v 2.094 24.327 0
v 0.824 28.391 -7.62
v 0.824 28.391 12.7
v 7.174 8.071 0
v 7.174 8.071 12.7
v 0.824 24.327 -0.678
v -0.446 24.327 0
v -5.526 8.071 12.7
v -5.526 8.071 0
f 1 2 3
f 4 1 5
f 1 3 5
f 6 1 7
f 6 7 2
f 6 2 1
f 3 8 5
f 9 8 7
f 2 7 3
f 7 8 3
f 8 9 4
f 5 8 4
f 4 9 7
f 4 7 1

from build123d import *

# Parameters (mm, degrees)
F1_DEPTH = 12.7
F3_DEPTH = 7.62
F5_DEPTH = 25.4
F7_DEPTH = 25.4


with BuildPart() as f1:
    # F0 (on Top) → F1 (new body)
    with BuildSketch(Plane.XY):
        Polygon((0.824413, 28.39133), (-5.525587, 8.07133), (7.174413, 8.07133), align=None)
    extrude(amount=F1_DEPTH)

    # F2 (on face) → F3 (join)
    with BuildSketch(Plane(origin=(0, 0, 0), x_dir=(1, 0, 0), z_dir=(0, 0, -1))):
        Polygon((2.094413, -24.32733), (-0.445587, -24.32733), (0.824413, -28.39133), align=None)
    extrude(amount=F3_DEPTH)

    # F4 (on face) → F5 (cut)
    with BuildSketch(Plane(origin=(-7.331874, 2.291211, 0), x_dir=(-0.298275, -0.95448, 0), z_dir=(-0.95448, 0.298275, 0))):
        Polygon((-23.087042, -7.62), (-23.087042, 0), (-27.344858, -7.62), align=None)
    extrude(amount=-F5_DEPTH, mode=Mode.SUBTRACT)

    # F6 (on face) → F7 (cut)
    with BuildSketch(Plane(origin=(8.834008, 2.760627, 0), x_dir=(-0.298275, 0.95448, 0), z_dir=(0.95448, 0.298275, 0))):
        Polygon((26.853055, -7.62), (22.595239, 0), (22.595239, -1.355872), align=None)
    extrude(amount=-F7_DEPTH, mode=Mode.SUBTRACT)


solid = f1.part
